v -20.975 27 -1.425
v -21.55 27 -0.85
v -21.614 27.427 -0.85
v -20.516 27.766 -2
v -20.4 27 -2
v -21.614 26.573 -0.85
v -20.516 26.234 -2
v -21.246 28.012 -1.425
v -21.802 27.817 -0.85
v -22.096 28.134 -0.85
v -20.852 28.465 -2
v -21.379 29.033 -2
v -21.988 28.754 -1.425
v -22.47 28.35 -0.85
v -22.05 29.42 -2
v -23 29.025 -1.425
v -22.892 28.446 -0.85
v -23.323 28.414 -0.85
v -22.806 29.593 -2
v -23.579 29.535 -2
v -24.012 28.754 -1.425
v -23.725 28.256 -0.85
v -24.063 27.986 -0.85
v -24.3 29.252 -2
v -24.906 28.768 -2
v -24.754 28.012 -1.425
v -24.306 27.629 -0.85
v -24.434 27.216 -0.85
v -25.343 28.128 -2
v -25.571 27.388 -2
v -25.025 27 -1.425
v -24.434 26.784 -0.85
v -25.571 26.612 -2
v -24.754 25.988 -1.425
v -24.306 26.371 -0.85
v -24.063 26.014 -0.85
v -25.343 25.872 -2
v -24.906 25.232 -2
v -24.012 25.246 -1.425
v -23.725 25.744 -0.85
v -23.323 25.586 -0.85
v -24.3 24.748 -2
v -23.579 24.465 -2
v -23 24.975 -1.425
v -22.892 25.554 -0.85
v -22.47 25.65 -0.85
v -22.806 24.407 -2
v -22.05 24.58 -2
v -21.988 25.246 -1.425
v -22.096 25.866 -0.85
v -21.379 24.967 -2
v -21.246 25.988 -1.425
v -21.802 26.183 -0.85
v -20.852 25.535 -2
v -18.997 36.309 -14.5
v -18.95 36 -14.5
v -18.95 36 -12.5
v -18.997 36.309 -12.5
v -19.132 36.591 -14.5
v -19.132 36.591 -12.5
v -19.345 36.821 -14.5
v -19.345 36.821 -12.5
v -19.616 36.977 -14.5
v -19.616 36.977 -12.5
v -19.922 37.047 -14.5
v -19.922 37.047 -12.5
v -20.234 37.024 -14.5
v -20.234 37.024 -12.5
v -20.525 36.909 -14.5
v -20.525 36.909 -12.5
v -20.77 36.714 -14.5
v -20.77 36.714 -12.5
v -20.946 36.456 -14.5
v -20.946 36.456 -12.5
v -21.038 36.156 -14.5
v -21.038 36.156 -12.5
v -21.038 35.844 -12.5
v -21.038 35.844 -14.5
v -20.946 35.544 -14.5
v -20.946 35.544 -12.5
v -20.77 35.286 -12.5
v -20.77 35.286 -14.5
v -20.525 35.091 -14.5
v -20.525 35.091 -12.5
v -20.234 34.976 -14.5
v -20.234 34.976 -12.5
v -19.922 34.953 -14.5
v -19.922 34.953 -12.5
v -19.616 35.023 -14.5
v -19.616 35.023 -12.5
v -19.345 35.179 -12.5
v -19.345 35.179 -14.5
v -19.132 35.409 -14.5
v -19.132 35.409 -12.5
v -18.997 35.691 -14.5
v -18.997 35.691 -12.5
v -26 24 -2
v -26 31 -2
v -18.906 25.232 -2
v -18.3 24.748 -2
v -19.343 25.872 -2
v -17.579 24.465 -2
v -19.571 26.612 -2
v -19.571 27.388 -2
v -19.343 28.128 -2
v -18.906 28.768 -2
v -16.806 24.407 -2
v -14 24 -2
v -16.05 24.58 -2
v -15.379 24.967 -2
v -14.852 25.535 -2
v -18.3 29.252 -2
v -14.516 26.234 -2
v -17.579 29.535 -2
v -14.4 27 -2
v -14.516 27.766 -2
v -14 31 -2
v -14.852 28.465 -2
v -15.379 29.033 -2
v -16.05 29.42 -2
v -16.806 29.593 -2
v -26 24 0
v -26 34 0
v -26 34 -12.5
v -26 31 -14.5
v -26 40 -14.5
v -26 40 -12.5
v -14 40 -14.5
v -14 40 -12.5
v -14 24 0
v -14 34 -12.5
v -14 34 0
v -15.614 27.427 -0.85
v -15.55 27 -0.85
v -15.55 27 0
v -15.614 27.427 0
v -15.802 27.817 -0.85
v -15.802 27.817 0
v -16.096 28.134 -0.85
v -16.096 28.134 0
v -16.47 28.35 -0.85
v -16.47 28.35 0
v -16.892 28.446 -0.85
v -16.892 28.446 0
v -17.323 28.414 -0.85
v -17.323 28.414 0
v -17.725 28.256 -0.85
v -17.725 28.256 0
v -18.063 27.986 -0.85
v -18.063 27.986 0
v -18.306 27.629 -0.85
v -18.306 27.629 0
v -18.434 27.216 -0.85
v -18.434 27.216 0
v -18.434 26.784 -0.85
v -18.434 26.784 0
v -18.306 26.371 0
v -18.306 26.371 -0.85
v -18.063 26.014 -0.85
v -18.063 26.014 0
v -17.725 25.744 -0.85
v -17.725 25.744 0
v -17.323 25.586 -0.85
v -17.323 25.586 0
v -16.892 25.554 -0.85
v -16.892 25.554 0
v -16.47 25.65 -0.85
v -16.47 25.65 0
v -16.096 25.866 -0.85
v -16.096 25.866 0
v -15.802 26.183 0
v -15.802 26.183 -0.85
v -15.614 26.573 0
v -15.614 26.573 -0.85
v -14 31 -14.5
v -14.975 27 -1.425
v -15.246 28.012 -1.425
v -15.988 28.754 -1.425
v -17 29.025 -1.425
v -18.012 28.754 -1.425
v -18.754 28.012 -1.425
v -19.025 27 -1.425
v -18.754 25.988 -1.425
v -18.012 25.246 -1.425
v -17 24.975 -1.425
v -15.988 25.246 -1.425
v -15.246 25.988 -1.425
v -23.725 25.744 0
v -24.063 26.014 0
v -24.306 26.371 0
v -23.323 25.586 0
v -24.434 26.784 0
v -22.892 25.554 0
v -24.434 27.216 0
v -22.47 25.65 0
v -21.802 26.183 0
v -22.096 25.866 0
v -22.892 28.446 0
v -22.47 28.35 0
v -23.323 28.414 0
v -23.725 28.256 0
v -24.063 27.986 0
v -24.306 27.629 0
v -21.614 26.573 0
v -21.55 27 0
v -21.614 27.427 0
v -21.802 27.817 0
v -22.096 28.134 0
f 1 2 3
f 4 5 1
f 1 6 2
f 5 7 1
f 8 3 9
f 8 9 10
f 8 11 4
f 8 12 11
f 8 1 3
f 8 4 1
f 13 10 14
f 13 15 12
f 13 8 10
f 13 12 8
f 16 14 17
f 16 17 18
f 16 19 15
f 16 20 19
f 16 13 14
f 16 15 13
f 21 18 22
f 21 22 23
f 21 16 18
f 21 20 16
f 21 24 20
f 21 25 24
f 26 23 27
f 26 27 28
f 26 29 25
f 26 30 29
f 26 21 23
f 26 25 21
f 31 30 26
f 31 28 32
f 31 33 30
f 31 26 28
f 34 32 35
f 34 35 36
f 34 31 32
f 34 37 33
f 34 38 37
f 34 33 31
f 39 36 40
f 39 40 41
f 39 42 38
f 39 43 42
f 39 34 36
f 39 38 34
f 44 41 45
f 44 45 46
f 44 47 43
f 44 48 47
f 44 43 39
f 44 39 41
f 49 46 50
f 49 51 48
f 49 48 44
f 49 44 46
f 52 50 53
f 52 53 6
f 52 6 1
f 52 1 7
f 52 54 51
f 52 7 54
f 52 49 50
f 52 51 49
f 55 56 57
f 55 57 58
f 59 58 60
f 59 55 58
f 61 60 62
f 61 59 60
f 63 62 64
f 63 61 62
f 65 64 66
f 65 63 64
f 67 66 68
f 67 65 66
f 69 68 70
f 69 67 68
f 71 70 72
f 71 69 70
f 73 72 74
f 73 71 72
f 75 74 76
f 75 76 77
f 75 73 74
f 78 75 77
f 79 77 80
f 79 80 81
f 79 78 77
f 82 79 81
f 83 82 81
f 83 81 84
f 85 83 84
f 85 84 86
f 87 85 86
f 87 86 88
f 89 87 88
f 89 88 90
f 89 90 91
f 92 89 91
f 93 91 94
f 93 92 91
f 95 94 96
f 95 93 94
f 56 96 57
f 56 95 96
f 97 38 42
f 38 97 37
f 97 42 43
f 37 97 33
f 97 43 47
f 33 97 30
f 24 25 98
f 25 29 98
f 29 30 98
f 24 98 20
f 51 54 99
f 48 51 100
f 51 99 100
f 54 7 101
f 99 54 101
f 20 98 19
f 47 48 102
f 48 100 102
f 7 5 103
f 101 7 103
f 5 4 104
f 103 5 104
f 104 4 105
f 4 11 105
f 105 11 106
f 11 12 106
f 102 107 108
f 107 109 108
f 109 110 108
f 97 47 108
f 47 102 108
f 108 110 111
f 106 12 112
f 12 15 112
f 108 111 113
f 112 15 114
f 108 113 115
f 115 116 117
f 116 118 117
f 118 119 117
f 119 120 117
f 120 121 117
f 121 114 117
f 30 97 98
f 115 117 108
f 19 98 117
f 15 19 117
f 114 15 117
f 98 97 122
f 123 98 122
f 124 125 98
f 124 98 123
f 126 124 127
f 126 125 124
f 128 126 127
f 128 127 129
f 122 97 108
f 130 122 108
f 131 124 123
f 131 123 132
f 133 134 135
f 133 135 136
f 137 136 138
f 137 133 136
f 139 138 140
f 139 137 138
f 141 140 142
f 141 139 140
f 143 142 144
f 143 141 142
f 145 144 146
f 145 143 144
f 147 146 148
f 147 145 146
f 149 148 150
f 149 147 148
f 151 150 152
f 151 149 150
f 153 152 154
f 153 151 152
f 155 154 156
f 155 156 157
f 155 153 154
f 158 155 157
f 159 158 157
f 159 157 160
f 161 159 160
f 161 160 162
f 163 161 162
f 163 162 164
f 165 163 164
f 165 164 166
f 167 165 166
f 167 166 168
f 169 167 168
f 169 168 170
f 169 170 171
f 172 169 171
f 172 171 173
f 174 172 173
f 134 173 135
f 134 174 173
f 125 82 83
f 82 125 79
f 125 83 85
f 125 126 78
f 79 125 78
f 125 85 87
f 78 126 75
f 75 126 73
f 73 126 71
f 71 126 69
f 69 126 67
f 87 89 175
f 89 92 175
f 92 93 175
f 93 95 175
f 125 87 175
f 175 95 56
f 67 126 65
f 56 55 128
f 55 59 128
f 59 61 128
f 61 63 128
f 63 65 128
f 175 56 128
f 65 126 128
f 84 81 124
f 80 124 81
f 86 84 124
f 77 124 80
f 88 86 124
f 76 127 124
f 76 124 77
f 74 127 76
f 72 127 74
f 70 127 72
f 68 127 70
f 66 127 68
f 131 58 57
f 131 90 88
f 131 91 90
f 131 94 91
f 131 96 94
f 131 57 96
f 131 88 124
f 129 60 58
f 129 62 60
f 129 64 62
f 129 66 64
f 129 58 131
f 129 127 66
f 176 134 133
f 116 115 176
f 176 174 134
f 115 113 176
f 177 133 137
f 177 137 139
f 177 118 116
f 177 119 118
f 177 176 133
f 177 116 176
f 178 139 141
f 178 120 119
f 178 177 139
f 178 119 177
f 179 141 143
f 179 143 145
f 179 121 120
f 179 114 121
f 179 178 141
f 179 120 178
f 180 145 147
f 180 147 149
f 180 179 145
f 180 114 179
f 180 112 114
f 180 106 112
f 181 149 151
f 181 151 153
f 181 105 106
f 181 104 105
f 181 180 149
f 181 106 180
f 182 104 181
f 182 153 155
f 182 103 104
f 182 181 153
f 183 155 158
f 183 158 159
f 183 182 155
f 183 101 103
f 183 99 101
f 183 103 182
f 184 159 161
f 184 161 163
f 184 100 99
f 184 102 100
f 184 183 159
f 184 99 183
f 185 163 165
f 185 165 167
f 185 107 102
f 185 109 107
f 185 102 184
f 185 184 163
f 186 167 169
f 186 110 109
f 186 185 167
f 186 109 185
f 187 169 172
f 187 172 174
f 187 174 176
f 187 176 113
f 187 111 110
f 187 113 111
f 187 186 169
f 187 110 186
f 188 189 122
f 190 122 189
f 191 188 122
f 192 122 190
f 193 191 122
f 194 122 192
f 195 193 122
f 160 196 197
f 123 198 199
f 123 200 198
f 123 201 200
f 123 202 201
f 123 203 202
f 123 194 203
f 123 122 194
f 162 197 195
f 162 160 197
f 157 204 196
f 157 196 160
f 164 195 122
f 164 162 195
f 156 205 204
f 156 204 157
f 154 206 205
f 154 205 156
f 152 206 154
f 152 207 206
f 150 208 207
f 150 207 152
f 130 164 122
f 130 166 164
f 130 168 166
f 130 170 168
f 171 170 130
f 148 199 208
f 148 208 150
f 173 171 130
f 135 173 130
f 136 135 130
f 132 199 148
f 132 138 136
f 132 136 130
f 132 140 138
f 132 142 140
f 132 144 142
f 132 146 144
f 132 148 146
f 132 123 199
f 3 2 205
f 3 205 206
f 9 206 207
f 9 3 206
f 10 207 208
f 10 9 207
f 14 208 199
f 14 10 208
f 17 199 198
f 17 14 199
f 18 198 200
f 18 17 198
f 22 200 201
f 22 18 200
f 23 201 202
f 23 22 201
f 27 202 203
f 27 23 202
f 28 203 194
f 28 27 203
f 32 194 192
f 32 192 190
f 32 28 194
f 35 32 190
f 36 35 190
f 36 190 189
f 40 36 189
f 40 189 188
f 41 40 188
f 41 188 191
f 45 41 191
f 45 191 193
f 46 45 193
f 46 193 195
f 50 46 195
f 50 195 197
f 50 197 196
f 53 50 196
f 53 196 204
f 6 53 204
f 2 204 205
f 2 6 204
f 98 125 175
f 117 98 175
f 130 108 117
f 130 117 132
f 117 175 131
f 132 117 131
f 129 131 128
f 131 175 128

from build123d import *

# Parameters (mm, degrees)
LINK_EYE_SHELF_START          = -14.5
SKETCH1_W                     = 12
SKETCH1_H                     = 9
SKETCH1_R                     = 1.05
LINK_EYE_SHELF_DEPTH          = 2
OUTBOARD_WEB_START            = -13.5
SKETCH2_W                     = 12
SKETCH2_H                     = 3
OUTBOARD_WEB_DEPTH            = 12.5
INTERMEDIATE_PLATE_FOOT_START = -2
SKETCH3_W                     = 12
SKETCH3_H                     = 10
SKETCH3_R                     = 1.45
INTERMEDIATE_PLATE_FOOT_DEPTH = 2
CHAMFER1_SIZE                 = 1.15


with BuildPart() as part:
    # Sketch1 → Link_Eye_Shelf (new body)
    with BuildSketch(Plane.XY.offset(LINK_EYE_SHELF_START)):
        with Locations((-20, 35.5)):
            Rectangle(SKETCH1_W, SKETCH1_H)
        with Locations((-20, 36)):
            Circle(SKETCH1_R, mode=Mode.SUBTRACT)
    extrude(amount=LINK_EYE_SHELF_DEPTH)

    # Sketch2 → Outboard_Web (add)
    with BuildSketch(Plane.XY.offset(OUTBOARD_WEB_START)):
        with Locations((-20, 32.5)):
            Rectangle(SKETCH2_W, SKETCH2_H)
    extrude(amount=OUTBOARD_WEB_DEPTH)

    # Sketch3 → Intermediate_Plate_Foot (add)
    with BuildSketch(Plane.XY.offset(INTERMEDIATE_PLATE_FOOT_START)):
        with Locations((-20, 29)):
            Rectangle(SKETCH3_W, SKETCH3_H)
        with Locations((-23, 27)):
            Circle(SKETCH3_R, mode=Mode.SUBTRACT)
        with Locations((-17, 27)):
            Circle(SKETCH3_R, mode=Mode.SUBTRACT)
    extrude(amount=INTERMEDIATE_PLATE_FOOT_DEPTH)

    # Chamfer1
    chamfer1_edges = [part.edges().sort_by_distance(p)[0] for p in [
        (-18.45, 27, -2),
        (-24.45, 27, -2),
    ]]
    chamfer(chamfer1_edges, length=CHAMFER1_SIZE)


solid = part.part
